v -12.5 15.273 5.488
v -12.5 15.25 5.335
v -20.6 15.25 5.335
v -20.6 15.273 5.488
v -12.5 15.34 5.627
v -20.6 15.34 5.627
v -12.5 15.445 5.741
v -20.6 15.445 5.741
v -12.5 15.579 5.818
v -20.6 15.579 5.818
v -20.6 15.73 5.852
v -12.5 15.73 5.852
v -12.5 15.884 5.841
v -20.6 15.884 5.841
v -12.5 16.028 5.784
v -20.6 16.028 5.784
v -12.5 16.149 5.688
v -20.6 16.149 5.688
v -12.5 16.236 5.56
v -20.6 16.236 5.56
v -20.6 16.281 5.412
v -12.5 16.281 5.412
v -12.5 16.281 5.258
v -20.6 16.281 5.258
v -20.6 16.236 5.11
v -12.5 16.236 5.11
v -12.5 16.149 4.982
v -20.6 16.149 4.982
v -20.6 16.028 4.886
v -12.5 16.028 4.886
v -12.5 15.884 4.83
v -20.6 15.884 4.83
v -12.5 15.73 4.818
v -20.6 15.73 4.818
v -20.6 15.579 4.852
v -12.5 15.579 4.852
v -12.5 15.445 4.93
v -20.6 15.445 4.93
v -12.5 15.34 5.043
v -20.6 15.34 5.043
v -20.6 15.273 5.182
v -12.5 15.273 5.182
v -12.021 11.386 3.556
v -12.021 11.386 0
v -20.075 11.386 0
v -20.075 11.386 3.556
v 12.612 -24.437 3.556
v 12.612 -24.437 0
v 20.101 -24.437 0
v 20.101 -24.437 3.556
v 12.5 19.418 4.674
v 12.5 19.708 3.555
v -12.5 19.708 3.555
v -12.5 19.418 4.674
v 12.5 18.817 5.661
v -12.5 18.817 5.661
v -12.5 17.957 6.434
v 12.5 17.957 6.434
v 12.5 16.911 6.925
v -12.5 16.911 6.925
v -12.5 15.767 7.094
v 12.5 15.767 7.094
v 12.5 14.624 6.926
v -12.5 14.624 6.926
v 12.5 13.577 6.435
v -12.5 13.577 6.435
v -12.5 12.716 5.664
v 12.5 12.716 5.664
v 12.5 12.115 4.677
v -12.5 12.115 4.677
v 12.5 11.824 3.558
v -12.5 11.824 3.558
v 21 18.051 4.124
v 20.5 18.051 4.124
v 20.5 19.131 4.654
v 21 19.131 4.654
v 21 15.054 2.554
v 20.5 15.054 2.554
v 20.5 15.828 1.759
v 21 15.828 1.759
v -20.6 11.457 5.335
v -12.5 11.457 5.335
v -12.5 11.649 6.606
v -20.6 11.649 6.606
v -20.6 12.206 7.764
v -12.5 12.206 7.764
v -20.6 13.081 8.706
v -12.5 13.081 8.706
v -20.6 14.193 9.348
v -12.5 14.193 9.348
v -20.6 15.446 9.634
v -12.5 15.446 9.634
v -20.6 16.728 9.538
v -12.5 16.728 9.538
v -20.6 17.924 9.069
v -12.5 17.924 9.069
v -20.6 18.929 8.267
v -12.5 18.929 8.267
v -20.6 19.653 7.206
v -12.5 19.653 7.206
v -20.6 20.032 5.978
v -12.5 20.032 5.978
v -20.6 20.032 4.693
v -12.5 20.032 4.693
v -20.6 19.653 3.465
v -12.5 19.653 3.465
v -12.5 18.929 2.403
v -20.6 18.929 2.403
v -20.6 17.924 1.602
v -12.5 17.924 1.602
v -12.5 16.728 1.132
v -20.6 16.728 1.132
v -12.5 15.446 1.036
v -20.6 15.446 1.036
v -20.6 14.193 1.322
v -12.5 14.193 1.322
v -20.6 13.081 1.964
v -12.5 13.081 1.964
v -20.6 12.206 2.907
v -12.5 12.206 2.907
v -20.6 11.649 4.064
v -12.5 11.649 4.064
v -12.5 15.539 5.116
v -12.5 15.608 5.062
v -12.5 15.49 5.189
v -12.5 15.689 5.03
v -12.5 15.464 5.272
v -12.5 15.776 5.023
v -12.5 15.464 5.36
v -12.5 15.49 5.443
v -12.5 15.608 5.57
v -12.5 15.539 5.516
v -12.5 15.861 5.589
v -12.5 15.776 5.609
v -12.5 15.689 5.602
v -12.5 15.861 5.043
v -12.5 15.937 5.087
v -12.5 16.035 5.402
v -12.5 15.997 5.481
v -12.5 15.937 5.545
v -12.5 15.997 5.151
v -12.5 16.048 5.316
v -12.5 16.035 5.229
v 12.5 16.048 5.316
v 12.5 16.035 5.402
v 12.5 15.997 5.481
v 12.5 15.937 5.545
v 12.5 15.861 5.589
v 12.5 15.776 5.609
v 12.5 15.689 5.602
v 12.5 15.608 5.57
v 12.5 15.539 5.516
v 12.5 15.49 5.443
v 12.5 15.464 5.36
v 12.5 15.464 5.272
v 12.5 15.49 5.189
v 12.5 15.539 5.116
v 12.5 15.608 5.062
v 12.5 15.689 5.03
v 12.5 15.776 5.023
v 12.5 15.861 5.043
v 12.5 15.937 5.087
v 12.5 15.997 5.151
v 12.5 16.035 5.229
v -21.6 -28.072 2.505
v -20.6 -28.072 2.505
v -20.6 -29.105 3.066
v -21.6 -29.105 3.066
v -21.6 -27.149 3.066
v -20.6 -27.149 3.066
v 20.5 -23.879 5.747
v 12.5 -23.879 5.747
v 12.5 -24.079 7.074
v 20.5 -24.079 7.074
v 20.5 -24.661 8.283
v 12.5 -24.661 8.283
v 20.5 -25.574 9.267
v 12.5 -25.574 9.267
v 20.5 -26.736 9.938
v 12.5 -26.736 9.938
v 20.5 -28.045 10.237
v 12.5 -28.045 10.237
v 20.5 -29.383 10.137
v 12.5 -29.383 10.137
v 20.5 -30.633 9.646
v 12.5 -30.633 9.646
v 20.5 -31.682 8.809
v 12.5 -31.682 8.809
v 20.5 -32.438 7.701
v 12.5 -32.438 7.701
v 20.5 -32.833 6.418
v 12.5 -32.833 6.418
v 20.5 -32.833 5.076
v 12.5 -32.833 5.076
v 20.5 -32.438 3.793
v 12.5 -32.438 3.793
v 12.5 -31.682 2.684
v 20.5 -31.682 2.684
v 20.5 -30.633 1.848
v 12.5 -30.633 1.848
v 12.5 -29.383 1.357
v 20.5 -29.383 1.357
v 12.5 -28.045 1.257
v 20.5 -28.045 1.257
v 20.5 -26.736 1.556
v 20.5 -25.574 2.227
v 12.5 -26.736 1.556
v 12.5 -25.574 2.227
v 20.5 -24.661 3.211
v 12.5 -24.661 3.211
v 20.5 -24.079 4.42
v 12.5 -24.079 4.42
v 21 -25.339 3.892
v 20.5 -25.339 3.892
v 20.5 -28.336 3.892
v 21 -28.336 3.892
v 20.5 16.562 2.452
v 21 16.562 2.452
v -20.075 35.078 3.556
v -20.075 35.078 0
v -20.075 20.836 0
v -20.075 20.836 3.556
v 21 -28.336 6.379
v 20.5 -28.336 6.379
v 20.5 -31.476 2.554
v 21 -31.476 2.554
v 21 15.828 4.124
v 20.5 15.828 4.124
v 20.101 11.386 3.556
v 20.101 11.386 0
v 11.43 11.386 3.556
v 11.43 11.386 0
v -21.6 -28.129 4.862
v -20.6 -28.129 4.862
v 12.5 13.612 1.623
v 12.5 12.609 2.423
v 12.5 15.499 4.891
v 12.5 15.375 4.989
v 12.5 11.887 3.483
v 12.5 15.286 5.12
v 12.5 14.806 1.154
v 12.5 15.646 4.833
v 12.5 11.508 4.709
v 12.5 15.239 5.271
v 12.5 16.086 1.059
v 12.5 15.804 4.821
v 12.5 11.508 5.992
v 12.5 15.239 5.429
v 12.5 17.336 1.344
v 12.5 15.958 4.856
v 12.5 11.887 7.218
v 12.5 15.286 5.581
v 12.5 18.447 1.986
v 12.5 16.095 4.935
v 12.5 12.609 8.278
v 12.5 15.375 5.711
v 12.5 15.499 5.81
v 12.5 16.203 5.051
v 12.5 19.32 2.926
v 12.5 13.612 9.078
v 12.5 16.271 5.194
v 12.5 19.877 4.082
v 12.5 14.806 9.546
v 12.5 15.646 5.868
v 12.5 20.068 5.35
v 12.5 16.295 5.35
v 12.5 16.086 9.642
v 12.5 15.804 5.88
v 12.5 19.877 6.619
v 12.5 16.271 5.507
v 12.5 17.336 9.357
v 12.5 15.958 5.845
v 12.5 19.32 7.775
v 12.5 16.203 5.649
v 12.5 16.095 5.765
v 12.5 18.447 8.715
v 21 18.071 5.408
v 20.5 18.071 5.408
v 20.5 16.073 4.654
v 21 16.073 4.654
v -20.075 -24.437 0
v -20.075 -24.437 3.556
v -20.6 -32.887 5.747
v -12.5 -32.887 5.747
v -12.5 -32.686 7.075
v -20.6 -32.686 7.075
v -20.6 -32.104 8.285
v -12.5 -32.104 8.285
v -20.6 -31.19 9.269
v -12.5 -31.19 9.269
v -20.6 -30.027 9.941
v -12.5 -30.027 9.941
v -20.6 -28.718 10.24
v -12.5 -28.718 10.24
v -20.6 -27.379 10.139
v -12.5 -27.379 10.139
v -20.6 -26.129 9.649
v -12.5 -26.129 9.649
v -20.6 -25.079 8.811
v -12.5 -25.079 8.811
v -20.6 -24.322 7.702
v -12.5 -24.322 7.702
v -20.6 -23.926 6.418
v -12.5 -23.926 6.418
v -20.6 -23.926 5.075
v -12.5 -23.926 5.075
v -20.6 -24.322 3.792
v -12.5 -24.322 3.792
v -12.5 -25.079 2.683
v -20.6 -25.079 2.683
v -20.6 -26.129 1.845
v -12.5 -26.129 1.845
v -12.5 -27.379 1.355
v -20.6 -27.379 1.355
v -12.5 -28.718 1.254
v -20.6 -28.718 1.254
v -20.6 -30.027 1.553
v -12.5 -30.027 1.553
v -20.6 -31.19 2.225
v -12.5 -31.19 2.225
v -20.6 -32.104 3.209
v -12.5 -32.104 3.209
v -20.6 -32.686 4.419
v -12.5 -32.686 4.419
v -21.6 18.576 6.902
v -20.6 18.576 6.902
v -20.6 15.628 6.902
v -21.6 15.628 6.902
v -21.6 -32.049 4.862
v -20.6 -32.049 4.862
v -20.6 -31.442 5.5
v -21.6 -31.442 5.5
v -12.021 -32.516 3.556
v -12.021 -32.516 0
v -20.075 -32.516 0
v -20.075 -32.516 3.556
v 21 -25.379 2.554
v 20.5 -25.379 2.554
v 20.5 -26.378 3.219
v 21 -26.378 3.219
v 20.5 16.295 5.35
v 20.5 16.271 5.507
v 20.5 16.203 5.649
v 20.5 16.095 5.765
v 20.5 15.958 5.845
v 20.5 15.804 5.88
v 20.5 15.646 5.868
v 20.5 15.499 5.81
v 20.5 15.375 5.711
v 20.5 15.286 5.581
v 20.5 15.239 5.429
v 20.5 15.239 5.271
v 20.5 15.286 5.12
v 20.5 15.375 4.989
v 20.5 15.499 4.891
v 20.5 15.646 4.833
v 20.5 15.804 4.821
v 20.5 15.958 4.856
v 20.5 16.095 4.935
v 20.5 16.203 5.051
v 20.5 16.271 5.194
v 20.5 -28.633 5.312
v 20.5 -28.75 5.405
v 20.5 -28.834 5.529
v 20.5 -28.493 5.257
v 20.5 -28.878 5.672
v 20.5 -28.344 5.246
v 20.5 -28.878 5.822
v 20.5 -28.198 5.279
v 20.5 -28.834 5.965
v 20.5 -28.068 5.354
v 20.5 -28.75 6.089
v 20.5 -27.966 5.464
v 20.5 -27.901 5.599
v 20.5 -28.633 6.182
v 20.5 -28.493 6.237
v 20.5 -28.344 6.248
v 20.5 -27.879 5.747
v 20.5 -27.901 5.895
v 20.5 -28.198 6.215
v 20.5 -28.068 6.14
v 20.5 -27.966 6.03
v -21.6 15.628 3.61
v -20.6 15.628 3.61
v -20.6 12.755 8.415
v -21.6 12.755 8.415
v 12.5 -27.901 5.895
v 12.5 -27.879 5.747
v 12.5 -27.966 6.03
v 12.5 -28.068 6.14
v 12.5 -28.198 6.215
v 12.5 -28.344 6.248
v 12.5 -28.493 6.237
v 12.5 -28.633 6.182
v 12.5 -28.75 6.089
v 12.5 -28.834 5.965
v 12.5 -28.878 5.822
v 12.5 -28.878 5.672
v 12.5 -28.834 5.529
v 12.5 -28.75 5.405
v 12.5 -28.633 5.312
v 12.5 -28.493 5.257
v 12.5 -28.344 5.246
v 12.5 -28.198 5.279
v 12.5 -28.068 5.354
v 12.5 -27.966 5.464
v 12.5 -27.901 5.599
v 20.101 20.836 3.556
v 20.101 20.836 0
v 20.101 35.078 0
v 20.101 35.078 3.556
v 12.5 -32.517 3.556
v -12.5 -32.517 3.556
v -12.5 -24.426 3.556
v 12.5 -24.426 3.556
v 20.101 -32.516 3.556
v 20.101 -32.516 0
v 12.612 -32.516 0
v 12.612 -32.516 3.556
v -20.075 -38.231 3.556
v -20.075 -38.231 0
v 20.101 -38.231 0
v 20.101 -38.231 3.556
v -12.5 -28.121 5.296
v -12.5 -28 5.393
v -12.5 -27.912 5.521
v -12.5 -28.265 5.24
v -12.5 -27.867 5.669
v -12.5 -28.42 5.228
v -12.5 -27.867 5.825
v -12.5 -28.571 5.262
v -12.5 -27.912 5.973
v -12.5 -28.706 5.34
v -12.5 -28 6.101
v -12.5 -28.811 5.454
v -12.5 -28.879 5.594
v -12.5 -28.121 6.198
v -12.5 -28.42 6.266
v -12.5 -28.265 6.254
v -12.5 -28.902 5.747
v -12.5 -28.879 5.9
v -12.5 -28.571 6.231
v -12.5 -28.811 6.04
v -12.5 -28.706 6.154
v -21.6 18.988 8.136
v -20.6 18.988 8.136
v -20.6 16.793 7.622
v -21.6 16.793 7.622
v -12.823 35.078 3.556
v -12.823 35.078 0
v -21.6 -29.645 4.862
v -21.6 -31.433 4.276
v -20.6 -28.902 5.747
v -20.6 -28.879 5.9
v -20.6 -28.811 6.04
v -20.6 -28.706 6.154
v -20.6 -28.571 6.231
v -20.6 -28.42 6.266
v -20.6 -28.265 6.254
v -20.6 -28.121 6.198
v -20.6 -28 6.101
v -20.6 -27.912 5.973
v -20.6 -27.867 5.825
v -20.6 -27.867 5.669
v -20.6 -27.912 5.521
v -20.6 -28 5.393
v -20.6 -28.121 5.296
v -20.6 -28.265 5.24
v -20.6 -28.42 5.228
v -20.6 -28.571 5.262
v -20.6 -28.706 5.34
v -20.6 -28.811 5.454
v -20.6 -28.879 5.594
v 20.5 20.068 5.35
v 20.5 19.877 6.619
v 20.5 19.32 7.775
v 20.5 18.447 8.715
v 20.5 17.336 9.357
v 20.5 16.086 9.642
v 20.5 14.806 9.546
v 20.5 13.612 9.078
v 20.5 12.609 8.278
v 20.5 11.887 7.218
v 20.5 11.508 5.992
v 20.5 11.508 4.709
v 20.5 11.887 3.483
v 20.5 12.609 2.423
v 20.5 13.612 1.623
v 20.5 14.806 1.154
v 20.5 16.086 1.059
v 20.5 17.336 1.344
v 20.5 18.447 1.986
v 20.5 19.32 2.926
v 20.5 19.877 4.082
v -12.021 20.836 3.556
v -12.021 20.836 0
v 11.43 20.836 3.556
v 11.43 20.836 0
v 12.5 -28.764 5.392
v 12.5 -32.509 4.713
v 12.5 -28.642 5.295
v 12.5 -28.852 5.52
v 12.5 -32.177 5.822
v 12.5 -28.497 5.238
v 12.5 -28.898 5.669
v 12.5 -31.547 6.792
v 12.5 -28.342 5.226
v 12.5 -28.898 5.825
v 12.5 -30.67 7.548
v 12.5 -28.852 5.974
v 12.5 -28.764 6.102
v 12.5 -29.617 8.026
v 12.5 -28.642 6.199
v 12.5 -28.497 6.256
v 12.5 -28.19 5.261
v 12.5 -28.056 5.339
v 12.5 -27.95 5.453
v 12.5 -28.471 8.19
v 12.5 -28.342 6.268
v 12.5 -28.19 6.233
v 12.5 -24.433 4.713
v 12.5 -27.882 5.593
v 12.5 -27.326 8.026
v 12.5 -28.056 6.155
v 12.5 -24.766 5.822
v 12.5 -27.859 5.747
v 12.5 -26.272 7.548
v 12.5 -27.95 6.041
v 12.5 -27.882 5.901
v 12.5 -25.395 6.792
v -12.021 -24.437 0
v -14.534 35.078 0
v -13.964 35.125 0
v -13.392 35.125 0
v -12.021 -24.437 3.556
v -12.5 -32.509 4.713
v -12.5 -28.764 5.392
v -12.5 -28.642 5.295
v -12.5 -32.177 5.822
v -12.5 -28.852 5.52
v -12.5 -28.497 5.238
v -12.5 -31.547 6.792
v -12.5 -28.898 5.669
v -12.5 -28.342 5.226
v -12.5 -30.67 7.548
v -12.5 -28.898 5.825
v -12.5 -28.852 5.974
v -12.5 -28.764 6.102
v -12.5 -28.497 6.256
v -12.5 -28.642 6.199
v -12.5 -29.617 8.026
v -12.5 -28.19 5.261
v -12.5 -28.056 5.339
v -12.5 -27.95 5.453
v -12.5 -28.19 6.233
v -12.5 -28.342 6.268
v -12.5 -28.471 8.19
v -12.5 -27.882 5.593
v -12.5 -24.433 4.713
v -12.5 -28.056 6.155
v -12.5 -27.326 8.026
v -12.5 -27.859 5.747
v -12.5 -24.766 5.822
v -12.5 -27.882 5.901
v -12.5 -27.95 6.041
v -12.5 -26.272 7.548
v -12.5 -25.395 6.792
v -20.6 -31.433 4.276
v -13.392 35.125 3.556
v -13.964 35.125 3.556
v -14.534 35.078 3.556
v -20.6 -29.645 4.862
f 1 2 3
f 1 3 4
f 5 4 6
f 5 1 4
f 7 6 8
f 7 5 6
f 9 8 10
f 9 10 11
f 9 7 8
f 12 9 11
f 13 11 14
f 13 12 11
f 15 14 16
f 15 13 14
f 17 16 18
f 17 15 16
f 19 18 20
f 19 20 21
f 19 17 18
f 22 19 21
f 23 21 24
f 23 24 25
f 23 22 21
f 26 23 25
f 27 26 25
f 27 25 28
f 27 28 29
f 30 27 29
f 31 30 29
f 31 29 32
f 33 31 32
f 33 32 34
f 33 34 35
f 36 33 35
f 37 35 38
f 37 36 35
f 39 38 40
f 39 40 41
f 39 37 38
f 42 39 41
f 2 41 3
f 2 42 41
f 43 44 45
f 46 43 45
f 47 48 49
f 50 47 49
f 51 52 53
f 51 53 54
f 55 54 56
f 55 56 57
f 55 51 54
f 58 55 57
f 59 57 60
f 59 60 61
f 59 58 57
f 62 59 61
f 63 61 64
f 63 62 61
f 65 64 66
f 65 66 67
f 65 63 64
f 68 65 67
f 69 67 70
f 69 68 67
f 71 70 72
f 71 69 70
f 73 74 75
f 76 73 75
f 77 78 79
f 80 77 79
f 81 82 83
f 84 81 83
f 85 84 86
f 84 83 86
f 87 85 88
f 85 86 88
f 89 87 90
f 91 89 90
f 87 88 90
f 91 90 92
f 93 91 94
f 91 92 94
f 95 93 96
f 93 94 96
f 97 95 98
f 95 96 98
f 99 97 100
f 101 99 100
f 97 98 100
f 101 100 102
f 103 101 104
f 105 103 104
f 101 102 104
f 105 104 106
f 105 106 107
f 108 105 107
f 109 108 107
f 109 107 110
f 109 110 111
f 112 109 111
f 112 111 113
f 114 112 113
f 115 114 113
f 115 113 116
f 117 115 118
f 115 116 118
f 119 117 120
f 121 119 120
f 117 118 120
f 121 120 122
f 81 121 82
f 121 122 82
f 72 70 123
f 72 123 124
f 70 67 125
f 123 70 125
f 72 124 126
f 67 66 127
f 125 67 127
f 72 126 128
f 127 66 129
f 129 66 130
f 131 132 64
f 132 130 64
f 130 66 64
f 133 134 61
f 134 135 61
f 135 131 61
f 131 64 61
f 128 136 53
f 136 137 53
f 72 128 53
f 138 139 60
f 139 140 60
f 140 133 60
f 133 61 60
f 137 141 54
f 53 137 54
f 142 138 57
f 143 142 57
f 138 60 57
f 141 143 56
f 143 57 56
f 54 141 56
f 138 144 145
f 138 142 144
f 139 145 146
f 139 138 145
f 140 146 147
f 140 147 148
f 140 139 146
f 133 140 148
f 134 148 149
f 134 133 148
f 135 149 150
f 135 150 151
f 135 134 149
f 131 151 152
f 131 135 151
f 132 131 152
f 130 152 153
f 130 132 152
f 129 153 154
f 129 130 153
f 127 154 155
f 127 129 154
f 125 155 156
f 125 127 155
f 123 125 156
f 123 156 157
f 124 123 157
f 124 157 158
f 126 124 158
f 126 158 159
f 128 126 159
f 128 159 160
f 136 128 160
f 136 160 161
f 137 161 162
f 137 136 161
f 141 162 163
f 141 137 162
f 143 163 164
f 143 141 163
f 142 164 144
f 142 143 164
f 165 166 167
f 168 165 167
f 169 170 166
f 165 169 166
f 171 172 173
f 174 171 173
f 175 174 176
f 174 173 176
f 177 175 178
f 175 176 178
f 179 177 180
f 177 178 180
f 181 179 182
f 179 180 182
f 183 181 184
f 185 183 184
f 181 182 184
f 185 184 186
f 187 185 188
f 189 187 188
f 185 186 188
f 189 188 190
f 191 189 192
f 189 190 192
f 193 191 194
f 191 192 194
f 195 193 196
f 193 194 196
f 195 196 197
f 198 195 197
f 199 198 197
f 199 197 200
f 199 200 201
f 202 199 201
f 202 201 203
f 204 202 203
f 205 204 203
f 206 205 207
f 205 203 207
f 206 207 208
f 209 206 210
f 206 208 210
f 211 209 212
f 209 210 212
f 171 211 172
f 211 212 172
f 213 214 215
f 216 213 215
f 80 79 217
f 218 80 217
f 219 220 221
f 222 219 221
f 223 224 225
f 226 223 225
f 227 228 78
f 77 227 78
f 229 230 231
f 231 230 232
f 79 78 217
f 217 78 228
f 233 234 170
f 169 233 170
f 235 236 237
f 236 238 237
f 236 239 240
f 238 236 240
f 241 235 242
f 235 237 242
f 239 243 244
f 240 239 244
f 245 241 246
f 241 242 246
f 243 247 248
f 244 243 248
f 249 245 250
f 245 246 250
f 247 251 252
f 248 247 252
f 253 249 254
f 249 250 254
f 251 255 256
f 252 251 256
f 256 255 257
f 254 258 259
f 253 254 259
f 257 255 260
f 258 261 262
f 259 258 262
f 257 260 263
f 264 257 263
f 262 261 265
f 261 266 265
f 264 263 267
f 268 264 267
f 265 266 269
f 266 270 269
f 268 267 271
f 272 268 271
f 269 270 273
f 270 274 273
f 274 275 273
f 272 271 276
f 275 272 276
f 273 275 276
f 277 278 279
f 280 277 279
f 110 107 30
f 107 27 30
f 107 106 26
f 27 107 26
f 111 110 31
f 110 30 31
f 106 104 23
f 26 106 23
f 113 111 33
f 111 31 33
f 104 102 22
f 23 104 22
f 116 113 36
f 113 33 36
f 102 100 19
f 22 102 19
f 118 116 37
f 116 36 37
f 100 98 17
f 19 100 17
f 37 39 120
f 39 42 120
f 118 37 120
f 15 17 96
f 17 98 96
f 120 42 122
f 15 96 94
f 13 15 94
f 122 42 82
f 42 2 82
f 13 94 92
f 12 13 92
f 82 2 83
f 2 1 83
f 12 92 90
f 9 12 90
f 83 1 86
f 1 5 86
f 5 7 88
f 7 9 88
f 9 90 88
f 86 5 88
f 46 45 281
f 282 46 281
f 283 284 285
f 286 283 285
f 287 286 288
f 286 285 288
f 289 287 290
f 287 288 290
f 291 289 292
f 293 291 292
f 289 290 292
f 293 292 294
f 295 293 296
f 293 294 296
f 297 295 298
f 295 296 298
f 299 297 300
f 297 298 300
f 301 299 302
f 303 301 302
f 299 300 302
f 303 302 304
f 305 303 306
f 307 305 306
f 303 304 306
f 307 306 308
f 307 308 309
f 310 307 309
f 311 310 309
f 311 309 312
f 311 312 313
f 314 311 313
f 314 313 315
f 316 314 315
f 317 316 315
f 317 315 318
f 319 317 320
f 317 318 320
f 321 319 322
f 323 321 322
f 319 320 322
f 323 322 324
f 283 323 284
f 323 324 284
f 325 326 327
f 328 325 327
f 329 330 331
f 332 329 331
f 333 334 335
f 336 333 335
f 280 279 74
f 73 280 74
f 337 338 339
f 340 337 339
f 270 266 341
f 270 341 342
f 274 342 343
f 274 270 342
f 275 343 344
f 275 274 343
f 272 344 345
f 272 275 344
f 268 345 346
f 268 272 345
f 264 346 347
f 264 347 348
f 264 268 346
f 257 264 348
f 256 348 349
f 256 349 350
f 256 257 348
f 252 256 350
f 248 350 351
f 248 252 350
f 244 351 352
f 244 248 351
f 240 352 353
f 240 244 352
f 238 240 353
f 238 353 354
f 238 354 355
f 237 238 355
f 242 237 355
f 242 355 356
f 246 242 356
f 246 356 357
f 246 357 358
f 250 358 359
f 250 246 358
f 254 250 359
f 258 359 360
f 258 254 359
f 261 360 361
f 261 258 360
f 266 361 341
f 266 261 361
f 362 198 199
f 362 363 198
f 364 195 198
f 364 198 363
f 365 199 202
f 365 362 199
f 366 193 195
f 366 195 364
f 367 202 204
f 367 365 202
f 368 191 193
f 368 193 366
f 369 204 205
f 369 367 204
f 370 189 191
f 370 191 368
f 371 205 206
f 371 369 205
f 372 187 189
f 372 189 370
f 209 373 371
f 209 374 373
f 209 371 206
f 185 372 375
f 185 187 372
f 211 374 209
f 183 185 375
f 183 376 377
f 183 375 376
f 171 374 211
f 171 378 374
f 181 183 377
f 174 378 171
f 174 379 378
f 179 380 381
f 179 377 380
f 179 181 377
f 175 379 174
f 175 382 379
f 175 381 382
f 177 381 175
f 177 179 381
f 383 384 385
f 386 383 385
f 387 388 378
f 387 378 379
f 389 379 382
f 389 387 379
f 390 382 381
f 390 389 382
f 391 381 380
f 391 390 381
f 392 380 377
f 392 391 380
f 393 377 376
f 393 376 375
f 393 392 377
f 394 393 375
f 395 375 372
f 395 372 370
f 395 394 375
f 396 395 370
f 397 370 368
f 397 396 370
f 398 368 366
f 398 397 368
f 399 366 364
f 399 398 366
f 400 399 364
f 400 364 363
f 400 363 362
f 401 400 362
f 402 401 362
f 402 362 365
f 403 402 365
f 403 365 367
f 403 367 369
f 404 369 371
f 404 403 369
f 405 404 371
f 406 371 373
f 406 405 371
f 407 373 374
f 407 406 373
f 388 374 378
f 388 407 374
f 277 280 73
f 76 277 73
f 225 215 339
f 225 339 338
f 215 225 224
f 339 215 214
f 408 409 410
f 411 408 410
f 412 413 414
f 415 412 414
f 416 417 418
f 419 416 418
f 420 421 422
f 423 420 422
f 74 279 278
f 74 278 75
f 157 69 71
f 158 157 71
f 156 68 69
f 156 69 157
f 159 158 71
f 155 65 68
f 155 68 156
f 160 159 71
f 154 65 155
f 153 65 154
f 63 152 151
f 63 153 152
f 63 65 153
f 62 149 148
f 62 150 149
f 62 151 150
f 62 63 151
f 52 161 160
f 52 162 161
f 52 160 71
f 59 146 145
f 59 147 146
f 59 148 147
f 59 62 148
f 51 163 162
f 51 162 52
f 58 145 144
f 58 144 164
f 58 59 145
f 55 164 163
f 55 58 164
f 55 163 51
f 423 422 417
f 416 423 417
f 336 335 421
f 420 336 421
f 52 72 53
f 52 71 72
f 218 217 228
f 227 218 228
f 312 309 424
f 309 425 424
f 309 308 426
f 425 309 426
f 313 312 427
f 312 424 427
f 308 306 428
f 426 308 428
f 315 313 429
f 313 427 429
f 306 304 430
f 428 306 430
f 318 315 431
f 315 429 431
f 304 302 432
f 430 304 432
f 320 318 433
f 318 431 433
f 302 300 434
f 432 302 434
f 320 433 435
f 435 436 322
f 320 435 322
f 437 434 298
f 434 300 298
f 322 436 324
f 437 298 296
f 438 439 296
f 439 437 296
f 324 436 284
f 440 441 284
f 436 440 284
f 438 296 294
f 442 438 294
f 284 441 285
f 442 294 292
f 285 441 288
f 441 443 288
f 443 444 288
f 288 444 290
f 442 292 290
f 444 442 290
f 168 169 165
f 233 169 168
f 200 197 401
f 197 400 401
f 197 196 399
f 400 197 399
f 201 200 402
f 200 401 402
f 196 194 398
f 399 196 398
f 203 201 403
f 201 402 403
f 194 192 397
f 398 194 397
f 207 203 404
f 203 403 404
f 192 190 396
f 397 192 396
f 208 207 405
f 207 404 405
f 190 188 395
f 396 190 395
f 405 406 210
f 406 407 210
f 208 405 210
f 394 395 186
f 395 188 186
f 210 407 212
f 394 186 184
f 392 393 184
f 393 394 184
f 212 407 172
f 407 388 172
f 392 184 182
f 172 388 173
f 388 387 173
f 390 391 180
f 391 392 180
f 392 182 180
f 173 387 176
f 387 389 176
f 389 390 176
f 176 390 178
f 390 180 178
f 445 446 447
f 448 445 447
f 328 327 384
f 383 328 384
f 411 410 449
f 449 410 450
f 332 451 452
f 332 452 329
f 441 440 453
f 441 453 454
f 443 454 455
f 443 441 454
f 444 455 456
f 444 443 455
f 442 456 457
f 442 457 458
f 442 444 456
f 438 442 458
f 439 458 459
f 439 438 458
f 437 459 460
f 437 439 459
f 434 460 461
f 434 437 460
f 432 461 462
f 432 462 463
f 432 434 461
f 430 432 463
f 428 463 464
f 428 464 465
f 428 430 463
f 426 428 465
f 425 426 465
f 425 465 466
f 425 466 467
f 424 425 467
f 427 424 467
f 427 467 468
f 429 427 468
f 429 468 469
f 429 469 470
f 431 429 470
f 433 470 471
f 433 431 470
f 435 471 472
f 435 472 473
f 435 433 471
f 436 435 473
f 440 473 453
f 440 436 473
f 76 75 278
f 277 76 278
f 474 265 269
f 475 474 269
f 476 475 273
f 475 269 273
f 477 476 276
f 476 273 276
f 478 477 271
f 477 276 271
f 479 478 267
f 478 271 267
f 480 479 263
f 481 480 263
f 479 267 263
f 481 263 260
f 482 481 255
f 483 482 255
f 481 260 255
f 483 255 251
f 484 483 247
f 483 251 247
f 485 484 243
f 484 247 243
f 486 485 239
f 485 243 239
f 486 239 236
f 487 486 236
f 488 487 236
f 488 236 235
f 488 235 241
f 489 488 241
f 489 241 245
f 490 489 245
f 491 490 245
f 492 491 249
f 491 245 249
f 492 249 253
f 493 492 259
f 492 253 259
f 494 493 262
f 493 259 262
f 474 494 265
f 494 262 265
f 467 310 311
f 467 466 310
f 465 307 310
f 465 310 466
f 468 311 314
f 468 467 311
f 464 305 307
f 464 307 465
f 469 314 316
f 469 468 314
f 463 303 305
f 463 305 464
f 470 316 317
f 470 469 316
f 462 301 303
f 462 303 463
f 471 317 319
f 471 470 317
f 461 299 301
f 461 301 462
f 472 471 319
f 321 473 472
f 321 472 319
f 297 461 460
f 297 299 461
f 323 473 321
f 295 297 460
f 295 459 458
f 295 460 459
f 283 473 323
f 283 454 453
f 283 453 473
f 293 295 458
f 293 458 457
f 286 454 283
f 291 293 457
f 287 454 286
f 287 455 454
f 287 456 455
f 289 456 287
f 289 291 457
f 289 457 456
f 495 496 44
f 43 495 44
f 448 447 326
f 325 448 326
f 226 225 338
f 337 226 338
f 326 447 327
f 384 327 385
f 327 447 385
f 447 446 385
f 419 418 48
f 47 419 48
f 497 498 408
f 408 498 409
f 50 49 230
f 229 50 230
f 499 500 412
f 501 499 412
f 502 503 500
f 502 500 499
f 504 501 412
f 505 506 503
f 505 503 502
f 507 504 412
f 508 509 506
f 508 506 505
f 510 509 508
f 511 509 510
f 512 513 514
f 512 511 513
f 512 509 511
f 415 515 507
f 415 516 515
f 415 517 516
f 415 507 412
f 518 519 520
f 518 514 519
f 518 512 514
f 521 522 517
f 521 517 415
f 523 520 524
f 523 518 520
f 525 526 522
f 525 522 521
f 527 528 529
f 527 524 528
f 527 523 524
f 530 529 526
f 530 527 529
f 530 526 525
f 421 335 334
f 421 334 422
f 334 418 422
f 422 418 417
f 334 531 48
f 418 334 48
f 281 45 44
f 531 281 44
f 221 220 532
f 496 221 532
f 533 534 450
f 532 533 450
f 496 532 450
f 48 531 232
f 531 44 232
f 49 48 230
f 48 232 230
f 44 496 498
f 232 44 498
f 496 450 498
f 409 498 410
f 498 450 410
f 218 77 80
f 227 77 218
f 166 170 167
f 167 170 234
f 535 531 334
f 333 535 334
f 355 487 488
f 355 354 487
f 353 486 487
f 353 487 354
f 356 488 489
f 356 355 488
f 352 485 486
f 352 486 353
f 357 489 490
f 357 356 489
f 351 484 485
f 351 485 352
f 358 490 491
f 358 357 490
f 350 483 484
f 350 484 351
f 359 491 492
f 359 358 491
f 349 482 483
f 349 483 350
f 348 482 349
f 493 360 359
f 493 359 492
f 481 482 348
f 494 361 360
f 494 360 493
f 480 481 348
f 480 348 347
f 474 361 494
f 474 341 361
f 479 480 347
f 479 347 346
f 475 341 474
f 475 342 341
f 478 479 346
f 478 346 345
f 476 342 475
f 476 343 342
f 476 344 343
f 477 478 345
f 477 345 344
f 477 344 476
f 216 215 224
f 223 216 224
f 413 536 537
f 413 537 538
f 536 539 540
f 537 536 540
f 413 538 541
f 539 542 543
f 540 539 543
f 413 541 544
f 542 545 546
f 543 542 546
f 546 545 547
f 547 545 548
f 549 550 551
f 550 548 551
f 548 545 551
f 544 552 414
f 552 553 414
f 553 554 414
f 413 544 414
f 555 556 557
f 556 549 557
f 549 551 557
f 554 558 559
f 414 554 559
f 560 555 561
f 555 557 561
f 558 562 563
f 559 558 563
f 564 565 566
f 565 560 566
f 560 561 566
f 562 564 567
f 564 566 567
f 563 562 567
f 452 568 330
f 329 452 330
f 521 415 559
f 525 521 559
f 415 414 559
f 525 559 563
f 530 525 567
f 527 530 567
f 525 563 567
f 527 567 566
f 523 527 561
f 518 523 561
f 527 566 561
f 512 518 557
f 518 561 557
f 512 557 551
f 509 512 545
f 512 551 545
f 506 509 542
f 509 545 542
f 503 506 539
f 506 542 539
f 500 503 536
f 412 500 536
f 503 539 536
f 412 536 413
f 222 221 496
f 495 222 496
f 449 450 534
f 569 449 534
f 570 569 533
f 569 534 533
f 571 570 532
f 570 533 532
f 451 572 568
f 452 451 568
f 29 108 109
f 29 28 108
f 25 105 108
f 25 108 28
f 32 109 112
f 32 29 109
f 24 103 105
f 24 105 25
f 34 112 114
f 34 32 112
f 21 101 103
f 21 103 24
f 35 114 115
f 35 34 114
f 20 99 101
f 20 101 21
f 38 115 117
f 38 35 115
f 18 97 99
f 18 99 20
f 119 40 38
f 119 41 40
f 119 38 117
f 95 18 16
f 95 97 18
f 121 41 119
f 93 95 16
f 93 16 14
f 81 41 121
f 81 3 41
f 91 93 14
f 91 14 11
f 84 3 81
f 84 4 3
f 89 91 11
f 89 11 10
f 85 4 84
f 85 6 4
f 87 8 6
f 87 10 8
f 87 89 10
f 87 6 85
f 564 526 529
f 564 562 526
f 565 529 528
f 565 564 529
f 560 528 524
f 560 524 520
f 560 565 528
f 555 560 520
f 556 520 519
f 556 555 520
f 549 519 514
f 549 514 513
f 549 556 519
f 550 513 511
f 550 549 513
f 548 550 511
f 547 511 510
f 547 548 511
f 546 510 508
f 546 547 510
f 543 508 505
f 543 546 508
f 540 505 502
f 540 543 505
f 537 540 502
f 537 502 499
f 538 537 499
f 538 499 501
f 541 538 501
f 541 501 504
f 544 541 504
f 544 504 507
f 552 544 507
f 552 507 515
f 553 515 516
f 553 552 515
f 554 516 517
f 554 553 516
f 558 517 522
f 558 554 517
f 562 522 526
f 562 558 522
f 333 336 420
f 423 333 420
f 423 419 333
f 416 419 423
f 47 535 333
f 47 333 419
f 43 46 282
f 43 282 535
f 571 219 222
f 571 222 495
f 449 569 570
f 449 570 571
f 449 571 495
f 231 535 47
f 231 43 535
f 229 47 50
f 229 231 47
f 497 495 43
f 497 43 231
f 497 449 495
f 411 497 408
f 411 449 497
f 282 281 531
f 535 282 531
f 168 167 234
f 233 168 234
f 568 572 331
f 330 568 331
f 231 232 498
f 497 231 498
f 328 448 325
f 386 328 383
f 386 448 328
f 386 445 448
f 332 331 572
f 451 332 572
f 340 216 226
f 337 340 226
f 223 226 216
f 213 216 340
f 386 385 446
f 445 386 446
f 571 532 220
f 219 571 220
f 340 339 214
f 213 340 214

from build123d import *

# Parameters (mm, degrees)
F1_DEPTH  = 3.556
F2_R      = 0.522268
F2_R_2    = 0.293463
F3_DEPTH  = 12.5
F4_R      = 4.502538
F4_R_2    = 0.502665
F4_R_3    = 4.303776
F4_R_4    = 0.530849
F5_DEPTH  = 8
F6_R      = 4.50536
F6_R_2    = 0.52042
F6_R_3    = 4.311157
F6_R_4    = 0.518578
F7_DEPTH  = 8.1
F9_DEPTH  = 1
F11_DEPTH = 0.5


with BuildPart() as f1:
    # F0 (on Top) → F1 (new body)
    with BuildSketch(Plane.XY):
        with BuildLine():
            ThreePointArc((-12.822542, 35.078276), (-13.678138, 35.130364), (-14.533733, 35.078276))
            Line((-14.533733, 35.078276), (-12.822542, 35.078276))
        make_face()
        Polygon((-12.822542, 35.078276), (-14.533733, 35.078276), (-20.074653, 35.078276), (-20.074653, 31.048741), (-20.074653, 20.836137), (-12.021207, 20.836137), (-12.021207, 11.385883), (-20.074653, 11.385883), (-20.074653, -24.436552), (-12.021207, -24.436552), (-12.021207, -32.516379), (-20.074653, -32.516379), (-20.074653, -35.37388), (-20.074653, -38.23138), (-15.39694, -38.23138), (16.356725, -38.23138), (20.101037, -38.23138), (20.101037, -35.37388), (20.101037, -32.516379), (12.612414, -32.516379), (12.612414, -24.436552), (20.101037, -24.436552), (20.101037, 11.385883), (11.430001, 11.385883), (11.430001, 20.836137), (20.101037, 20.836137), (20.101037, 30.516615), (20.101037, 35.078276), (14.974757, 35.078276), align=None)
    extrude(amount=F1_DEPTH)


with BuildPart() as f3:
    # F2 (on Right) → F3 (new body, symmetric)
    with BuildSketch(Plane.YZ):
        with BuildLine():
            Line((-32.516532, 3.555826), (-24.425816, 3.555869))
            ThreePointArc((-24.425816, 3.555869), (-28.471198, 8.190474), (-32.516532, 3.555826))
        make_face()
        with Locations((-28.381243, 5.746942)):
            Circle(F2_R, mode=Mode.SUBTRACT)
        with BuildLine():
            Line((11.82367, 3.558025), (19.70811, 3.554932))
            ThreePointArc((19.70811, 3.554932), (15.767278, 7.094154), (11.82367, 3.558025))
        make_face()
        with Locations((15.754232, 5.315994)):
            Circle(F2_R_2, mode=Mode.SUBTRACT)
    extrude(amount=F3_DEPTH, both=True)


with BuildPart() as f5:
    # F4 (on face) → F5 (new body)
    with BuildSketch(Plane.YZ.offset(12.5)):
        with Locations((-28.381243, 5.746942)):
            Circle(F4_R)
        with Locations((-28.381243, 5.746942)):
            Circle(F4_R_2, mode=Mode.SUBTRACT)
        with Locations((15.764086, 5.350365)):
            Circle(F4_R_3)
        with Locations((15.764086, 5.350365)):
            Circle(F4_R_4, mode=Mode.SUBTRACT)
    extrude(amount=F5_DEPTH)


with BuildPart() as f7:
    # F6 (on face) → F7 (new body)
    with BuildSketch(Plane(origin=(-12.5, 0, 0), x_dir=(0, -1, 0), z_dir=(-1, 0, 0))):
        with Locations((28.381243, 5.746942)):
            Circle(F6_R)
        with Locations((28.381243, 5.746942)):
            Circle(F6_R_2, mode=Mode.SUBTRACT)
        with Locations((-15.768513, 5.335092)):
            Circle(F6_R_3)
        with Locations((-15.768513, 5.335092)):
            Circle(F6_R_4, mode=Mode.SUBTRACT)
    extrude(amount=F7_DEPTH)


with BuildPart() as f9:
    # F8 (on face) → F9 (new body)
    with BuildSketch(Plane(origin=(-20.6, 0, 0), x_dir=(0, -1, 0), z_dir=(-1, 0, 0))):
        Polygon((29.644795, 4.861619), (31.432573, 4.275721), (32.049, 4.861619), (31.441881, 5.500373), align=None)
        Polygon((29.104868, 3.065749), (28.128907, 4.861619), (27.149217, 3.065749), (28.072236, 2.504568), align=None)
        Polygon((-12.755205, 8.41512), (-18.98784, 8.136082), (-16.79337, 7.621754), (-18.576378, 6.901693), (-15.627559, 6.901693), (-15.627559, 3.609989), align=None)
    extrude(amount=F9_DEPTH)


with BuildPart() as f11:
    # F10 (on face) → F11 (new body)
    with BuildSketch(Plane.YZ.offset(20.5)):
        Polygon((16.073097, 4.653967), (18.050743, 4.123876), (19.131314, 4.653967), (18.071132, 5.408328), align=None)
        Polygon((15.053691, 2.553992), (15.82844, 1.758855), (16.562412, 2.452051), (15.82844, 4.123876), align=None)
        Polygon((-31.475514, 2.553992), (-25.37947, 2.553992), (-26.378486, 3.219116), (-25.338693, 3.891923), (-28.335746, 3.891923), (-28.335746, 6.379273), align=None)
    extrude(amount=F11_DEPTH)


solid = Compound([f1.part, f3.part, f5.part, f7.part, f9.part, f11.part])
